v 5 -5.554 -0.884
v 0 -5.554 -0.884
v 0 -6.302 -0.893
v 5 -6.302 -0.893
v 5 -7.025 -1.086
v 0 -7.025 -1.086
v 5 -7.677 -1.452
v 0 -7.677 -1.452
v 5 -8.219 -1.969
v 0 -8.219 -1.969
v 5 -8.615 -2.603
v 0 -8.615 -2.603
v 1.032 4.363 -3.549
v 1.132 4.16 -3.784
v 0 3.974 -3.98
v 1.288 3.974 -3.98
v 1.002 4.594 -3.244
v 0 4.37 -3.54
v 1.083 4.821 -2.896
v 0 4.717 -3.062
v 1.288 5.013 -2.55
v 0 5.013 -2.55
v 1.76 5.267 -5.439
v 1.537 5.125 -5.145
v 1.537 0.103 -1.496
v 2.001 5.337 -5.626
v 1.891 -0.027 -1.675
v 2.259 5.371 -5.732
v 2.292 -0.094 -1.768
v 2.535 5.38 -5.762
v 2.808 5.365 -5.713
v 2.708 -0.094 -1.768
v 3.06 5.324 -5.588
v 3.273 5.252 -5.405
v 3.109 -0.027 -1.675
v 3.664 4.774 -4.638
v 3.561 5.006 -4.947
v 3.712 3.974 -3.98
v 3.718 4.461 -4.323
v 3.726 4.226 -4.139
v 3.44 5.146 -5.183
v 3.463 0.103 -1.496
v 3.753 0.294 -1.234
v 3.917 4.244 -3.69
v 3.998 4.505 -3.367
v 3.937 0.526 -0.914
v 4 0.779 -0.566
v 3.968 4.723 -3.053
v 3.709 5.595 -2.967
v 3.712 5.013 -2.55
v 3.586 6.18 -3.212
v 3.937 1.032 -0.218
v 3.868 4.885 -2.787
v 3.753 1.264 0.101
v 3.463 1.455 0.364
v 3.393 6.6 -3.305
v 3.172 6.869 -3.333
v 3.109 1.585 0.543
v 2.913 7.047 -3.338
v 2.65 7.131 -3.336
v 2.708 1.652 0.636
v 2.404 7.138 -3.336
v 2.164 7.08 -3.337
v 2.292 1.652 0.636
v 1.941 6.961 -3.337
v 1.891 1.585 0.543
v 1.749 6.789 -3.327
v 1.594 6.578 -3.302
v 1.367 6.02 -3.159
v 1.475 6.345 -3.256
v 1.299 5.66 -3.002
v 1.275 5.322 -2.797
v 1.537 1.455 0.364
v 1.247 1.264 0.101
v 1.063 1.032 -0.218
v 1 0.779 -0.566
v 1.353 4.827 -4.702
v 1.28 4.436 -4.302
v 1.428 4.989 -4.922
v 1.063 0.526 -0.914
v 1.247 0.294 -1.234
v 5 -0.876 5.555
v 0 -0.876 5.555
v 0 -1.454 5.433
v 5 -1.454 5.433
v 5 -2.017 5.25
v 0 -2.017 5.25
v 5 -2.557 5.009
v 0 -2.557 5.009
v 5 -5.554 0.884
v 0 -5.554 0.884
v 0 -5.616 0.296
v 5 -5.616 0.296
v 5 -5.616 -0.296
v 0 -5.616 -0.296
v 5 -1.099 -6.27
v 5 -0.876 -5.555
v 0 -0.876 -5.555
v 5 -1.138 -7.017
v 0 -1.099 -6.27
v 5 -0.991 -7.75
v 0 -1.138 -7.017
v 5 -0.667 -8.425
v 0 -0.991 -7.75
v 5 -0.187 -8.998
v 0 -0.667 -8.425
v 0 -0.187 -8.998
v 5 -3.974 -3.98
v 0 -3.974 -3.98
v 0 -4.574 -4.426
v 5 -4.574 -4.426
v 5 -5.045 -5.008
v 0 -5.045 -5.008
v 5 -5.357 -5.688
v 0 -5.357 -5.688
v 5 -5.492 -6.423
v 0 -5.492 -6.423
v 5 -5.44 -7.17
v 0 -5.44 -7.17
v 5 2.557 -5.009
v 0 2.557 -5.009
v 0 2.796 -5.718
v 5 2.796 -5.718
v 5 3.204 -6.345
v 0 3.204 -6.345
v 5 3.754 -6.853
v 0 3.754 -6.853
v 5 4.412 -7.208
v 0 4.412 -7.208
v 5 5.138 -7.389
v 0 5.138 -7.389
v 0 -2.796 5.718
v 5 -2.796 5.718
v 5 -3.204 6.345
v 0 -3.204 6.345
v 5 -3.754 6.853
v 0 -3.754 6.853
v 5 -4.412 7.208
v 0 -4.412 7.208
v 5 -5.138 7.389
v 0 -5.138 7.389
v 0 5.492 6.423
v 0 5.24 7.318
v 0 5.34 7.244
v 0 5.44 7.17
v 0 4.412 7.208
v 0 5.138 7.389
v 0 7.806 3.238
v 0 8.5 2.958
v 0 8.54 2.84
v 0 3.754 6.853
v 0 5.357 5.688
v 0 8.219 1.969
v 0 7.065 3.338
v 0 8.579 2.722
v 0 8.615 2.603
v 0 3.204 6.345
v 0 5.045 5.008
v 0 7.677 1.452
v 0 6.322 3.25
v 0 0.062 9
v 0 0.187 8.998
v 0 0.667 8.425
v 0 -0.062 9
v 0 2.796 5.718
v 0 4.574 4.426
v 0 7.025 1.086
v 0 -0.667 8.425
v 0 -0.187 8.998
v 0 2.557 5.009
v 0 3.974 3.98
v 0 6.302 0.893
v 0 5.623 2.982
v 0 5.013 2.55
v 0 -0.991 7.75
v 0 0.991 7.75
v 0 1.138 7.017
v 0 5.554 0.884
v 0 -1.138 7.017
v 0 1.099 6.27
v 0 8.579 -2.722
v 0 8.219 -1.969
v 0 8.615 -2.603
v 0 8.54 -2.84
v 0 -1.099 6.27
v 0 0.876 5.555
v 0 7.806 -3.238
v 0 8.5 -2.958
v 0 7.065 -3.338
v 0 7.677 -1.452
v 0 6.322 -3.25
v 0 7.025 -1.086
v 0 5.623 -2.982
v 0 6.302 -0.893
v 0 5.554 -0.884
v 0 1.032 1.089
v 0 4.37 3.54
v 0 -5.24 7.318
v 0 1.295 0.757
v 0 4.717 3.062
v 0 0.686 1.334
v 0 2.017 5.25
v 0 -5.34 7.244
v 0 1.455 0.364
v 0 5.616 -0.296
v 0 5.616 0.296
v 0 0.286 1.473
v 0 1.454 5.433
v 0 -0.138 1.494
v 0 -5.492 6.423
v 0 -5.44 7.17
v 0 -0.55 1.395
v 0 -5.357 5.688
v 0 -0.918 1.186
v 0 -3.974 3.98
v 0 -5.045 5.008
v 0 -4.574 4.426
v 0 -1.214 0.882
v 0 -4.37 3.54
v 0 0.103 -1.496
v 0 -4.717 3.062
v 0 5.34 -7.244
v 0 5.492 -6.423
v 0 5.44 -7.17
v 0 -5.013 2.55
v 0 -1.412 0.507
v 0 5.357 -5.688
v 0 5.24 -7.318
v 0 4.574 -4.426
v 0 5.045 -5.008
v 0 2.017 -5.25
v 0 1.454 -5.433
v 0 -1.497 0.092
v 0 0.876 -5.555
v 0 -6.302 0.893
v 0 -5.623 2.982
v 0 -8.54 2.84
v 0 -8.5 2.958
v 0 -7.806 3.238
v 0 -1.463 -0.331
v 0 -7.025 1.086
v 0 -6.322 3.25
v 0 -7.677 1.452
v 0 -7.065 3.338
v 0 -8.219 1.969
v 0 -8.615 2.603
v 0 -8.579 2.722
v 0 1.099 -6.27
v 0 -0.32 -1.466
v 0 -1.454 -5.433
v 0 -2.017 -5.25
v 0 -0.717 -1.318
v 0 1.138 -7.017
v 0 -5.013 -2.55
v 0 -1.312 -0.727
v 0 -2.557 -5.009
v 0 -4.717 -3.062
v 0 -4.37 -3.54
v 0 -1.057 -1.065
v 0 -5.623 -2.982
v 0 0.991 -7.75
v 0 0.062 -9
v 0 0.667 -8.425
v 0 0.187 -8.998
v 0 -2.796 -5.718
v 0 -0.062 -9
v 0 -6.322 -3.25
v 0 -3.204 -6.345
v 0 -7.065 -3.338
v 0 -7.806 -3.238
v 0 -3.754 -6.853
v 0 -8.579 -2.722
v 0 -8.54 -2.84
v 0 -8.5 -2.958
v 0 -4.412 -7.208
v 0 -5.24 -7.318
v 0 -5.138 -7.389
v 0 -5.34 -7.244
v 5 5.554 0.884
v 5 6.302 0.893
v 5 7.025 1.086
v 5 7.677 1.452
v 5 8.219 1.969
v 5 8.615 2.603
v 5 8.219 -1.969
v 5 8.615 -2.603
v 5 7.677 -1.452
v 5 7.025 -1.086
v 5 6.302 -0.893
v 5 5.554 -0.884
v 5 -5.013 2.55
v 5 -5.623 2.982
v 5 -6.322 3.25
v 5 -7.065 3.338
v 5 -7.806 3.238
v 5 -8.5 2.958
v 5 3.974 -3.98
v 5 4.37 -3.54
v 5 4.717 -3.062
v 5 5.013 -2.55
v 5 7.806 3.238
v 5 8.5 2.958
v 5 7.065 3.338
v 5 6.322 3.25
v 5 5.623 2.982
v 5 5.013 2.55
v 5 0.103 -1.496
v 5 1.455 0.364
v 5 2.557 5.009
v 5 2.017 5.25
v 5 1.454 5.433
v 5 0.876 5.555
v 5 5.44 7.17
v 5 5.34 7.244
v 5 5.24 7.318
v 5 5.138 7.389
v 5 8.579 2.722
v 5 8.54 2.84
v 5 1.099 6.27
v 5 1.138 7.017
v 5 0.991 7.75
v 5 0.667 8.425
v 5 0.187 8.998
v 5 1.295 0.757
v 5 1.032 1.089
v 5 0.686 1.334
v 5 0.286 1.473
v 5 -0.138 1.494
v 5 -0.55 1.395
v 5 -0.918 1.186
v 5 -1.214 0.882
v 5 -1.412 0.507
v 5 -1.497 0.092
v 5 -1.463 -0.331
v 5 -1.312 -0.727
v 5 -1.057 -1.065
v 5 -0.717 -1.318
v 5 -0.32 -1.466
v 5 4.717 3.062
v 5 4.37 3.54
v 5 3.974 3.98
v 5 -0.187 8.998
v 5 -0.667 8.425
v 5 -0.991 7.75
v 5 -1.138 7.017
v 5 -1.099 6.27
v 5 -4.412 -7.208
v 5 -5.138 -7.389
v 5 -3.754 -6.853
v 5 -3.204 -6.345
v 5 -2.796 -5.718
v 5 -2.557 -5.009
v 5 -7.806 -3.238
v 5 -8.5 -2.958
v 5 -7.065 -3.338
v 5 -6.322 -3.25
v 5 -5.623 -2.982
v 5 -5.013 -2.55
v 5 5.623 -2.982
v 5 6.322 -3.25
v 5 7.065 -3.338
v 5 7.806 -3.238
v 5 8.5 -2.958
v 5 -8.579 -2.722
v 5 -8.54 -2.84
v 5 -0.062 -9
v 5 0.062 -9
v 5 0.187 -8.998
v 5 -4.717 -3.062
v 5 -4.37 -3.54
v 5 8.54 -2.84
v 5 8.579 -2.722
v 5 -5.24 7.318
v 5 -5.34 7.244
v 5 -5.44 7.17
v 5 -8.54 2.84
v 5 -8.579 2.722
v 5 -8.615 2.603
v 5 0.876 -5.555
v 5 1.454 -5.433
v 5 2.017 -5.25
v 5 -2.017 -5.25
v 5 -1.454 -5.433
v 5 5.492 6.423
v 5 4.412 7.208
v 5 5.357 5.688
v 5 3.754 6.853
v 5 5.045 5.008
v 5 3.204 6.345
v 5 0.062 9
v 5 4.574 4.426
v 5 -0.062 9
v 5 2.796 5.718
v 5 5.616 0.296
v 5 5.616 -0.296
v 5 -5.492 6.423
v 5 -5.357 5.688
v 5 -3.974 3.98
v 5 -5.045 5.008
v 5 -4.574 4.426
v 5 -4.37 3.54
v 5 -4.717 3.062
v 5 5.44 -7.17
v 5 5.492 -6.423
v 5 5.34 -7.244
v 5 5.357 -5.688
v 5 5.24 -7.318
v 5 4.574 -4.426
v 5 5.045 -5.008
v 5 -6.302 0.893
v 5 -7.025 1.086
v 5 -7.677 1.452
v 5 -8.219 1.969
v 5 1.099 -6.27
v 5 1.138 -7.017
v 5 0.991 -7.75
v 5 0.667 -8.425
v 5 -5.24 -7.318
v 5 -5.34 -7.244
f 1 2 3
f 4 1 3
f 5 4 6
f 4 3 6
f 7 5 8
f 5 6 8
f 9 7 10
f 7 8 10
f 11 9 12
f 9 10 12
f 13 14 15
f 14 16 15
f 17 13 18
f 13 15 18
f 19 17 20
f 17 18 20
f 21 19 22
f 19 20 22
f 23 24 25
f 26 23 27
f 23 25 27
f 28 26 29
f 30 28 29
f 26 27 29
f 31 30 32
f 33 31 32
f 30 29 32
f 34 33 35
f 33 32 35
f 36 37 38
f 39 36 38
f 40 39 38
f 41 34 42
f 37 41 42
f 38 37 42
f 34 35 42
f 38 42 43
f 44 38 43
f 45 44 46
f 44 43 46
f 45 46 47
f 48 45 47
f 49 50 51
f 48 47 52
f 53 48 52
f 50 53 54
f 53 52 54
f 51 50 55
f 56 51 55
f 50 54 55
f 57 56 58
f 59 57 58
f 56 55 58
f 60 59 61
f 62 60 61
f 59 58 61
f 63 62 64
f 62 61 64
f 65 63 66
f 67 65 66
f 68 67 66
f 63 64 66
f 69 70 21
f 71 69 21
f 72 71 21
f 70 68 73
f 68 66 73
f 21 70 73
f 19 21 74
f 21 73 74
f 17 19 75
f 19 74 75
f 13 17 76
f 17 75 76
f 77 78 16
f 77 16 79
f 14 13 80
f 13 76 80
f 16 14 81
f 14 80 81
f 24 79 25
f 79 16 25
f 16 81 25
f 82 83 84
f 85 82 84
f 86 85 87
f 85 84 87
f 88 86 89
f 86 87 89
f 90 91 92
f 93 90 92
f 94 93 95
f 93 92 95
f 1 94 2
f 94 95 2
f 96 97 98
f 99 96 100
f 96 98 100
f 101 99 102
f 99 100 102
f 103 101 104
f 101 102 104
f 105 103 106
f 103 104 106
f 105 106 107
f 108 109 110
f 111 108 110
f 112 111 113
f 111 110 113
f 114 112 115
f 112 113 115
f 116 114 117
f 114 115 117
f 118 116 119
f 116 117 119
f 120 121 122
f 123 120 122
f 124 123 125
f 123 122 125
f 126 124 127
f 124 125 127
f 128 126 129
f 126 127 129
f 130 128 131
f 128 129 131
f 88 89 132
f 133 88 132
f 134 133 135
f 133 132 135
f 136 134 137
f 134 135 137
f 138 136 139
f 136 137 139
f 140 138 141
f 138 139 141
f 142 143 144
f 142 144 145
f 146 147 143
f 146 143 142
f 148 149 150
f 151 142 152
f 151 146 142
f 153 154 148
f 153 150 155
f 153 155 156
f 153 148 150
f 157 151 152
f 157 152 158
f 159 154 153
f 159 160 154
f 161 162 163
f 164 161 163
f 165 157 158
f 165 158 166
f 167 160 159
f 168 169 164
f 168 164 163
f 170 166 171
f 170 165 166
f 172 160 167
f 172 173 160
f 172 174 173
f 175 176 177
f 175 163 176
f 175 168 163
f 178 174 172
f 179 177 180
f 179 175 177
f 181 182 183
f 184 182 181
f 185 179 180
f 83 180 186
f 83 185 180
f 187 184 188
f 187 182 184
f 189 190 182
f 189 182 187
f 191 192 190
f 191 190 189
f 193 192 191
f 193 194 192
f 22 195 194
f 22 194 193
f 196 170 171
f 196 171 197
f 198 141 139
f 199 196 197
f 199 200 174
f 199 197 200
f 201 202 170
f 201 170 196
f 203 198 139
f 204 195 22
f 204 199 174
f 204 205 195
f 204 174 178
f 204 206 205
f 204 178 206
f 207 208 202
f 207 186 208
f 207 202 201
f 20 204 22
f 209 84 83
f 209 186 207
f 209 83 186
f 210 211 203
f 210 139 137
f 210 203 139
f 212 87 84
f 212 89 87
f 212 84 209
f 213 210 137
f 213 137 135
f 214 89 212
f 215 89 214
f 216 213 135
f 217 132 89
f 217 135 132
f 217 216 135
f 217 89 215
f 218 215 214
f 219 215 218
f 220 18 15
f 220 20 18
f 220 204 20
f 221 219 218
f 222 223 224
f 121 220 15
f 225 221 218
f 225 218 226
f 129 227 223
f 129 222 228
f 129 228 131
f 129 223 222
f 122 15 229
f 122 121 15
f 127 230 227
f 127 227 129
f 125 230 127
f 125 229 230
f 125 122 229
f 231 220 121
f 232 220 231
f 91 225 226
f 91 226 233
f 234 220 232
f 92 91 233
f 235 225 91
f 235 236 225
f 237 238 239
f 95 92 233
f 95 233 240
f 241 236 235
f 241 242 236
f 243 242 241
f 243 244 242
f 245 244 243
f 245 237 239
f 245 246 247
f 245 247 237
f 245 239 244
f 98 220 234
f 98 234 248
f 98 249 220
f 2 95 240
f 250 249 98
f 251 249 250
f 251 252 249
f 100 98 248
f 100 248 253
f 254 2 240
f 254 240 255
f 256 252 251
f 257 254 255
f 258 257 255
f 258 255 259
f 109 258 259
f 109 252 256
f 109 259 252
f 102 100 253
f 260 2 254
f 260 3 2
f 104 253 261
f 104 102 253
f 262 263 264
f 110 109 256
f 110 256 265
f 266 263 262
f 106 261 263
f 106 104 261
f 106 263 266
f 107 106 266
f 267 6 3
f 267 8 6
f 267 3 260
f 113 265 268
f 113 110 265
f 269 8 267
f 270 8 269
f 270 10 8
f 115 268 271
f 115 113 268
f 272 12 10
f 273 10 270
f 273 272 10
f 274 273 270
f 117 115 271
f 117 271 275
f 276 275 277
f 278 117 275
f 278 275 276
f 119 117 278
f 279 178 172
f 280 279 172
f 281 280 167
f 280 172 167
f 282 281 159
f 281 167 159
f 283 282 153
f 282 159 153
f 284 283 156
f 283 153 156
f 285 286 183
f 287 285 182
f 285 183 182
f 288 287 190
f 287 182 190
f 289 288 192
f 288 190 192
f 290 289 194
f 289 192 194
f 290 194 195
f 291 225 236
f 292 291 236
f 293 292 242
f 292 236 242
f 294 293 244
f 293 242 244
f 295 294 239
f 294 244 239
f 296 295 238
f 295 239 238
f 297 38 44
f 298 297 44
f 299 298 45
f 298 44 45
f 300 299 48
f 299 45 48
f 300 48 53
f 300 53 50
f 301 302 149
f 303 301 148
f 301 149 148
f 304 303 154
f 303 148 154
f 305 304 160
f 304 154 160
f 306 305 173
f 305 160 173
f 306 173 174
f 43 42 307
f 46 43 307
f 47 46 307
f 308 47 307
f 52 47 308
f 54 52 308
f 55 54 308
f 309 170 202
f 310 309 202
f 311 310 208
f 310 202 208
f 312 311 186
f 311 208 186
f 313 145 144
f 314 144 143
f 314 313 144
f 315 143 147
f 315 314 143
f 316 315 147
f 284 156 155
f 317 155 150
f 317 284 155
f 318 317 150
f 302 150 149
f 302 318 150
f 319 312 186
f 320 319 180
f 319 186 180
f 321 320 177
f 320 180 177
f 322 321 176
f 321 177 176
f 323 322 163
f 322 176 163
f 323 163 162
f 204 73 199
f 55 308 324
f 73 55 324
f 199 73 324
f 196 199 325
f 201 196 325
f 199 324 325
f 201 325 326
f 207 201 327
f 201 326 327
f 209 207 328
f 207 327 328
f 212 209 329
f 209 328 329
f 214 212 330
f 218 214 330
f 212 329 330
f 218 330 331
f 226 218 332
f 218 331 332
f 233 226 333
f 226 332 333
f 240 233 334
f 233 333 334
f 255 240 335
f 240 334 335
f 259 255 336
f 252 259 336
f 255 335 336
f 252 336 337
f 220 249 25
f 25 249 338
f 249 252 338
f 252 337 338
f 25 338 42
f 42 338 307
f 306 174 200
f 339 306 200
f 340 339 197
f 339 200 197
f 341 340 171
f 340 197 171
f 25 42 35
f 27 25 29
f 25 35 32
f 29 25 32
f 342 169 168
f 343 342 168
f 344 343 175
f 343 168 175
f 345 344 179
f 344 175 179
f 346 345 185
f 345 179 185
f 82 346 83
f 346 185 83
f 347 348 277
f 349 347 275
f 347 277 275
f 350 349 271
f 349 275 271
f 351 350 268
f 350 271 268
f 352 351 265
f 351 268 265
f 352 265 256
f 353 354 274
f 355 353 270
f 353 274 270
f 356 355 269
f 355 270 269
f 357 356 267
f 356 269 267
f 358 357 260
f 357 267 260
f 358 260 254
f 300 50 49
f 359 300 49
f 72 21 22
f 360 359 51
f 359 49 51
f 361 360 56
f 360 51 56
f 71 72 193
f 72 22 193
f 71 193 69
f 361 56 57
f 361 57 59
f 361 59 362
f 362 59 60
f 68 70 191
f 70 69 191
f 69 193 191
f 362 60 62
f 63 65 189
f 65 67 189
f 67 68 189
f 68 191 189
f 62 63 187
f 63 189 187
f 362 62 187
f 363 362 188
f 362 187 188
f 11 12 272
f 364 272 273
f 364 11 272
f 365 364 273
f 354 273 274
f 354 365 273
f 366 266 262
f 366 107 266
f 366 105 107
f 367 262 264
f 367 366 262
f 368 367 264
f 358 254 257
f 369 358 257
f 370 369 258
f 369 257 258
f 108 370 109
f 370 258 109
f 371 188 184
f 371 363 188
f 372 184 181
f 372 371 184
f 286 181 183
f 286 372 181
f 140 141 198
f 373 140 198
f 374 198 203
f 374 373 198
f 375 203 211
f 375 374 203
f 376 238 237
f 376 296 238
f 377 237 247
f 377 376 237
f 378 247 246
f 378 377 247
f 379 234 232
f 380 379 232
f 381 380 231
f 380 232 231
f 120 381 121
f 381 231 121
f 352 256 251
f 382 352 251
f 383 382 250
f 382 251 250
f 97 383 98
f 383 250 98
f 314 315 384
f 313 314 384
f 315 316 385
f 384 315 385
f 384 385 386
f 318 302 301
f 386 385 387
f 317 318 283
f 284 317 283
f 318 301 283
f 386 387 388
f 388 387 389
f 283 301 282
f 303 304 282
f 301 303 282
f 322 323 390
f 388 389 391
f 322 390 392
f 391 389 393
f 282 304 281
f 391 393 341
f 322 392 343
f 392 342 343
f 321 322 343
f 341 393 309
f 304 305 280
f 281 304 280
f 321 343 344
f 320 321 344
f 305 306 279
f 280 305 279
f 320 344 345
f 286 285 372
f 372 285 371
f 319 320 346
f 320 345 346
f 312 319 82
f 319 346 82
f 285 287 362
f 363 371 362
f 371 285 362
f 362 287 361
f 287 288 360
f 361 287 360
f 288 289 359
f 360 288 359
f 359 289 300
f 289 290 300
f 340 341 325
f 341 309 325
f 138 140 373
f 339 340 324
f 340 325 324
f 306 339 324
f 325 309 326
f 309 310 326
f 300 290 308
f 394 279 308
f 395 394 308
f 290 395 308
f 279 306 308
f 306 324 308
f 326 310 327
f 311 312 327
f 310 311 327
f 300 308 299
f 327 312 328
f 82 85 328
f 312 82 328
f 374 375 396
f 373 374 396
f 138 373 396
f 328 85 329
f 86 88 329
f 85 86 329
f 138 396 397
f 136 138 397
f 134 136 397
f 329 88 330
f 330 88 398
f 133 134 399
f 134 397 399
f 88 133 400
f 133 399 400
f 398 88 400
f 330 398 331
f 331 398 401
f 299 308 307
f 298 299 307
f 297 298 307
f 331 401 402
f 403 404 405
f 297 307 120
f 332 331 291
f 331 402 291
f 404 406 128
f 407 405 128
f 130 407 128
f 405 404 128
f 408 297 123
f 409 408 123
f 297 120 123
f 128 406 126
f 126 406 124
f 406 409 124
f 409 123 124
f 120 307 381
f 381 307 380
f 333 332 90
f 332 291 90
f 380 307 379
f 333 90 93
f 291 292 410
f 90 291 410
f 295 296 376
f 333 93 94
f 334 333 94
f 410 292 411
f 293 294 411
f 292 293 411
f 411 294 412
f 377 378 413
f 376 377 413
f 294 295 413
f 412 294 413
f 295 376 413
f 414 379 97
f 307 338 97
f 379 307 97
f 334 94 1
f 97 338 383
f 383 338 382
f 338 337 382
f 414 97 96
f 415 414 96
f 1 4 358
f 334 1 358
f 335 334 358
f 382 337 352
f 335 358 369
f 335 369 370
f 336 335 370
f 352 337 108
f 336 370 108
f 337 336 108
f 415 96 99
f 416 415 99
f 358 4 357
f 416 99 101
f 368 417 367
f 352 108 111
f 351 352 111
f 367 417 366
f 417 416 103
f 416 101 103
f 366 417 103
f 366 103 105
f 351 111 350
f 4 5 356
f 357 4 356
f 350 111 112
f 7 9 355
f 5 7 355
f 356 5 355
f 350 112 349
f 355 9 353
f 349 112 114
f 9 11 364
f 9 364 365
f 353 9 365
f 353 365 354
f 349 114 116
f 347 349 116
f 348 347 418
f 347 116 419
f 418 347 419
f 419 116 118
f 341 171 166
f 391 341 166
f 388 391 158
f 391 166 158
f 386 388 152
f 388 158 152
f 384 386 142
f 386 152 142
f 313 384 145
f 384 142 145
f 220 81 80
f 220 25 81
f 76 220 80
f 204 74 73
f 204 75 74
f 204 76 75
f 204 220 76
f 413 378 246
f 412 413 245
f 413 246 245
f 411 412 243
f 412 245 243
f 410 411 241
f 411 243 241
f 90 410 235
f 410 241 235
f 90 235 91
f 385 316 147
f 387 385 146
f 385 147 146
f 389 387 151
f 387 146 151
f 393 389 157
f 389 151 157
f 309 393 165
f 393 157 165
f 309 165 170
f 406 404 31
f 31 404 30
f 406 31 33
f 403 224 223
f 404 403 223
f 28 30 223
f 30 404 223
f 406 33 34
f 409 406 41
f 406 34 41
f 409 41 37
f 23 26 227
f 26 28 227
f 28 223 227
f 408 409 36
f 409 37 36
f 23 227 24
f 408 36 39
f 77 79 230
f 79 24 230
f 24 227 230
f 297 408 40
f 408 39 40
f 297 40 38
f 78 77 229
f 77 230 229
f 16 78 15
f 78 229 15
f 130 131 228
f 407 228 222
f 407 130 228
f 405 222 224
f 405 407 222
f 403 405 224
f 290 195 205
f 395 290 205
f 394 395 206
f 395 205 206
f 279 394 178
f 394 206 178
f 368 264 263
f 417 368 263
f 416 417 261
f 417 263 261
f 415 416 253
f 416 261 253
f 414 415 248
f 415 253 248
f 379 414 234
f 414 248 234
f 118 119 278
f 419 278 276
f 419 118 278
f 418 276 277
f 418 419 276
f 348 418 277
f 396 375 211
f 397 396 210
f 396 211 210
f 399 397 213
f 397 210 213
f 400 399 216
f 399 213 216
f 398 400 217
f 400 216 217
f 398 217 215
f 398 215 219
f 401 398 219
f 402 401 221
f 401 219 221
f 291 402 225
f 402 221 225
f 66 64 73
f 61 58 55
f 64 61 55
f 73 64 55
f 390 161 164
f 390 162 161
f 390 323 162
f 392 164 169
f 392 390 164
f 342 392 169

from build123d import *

# Parameters (mm, degrees)
BASPROSKE_W         = 5
BASPROSKE_H         = 9
TOOTHCUT_DEPTH      = 14.674794331
TEETHCUTS_COUNT     = 10
TEETHCUTS_ANGLE     = 324
BORSKE_R            = 1.5
BORE_DEPTH          = 50.0001524
EXTRUDE_1_DEPTH     = 5
SKETCH_3_R          = 1.5
CUT_EXTRUDE_1_DEPTH = 7


with BuildPart() as part:
    # BasProSke → Base-Revolve (revolve)
    with BuildSketch(Plane(origin=(0, 0, 0), x_dir=(1, 0, 0), z_dir=(0, 1, 0)), mode=Mode.PRIVATE) as base_revolve_sk:
        with Locations((2.5, 4.5)):
            Rectangle(BASPROSKE_W, BASPROSKE_H)
    revolve(base_revolve_sk.sketch.rotate(Axis((-10, 0, 0), (1, 0, 0)), 180), axis=Axis((-10, 0, 0), (1, 0, 0)))

    # TooCutSke → ToothCut (cut, through all)
    with BuildSketch(Plane(origin=(0, 0, 0), x_dir=(0, 0, -1), z_dir=(1, 0, 0))):
        with BuildLine():
            ThreePointArc((0.883878355, 5.554109745), (0, 5.624), (-0.883878355, 5.554109745))
            ThreePointArc((-0.883878355, 5.554109745), (-1.258245767, 7.379188248), (-2.637816971, 8.631324741))
            ThreePointArc((-2.637816971, 8.631324741), (0, 9.0254), (2.637816971, 8.631324741))
            ThreePointArc((2.637816971, 8.631324741), (1.258245767, 7.379188248), (0.883878355, 5.554109745))
        make_face()
    toothcut = extrude(amount=TOOTHCUT_DEPTH, mode=Mode.SUBTRACT)

    # TeethCuts: ToothCut ×10 about axis
    teethcuts_axis = Axis((-10, 0, 0), (1, 0, 0))
    for i in range(1, TEETHCUTS_COUNT):
        add(toothcut.rotate(teethcuts_axis, i * TEETHCUTS_ANGLE / (TEETHCUTS_COUNT - 1)), mode=Mode.SUBTRACT)

    # BorSke → Bore (cut, symmetric)
    with BuildSketch(Plane(origin=(0, 0, 0), x_dir=(0, 0, -1), z_dir=(1, 0, 0))):
        with Locations(Location((0, 0, 0), (0, 0, 180))):
            Circle(BORSKE_R)
    extrude(amount=BORE_DEPTH, both=True, mode=Mode.SUBTRACT)

    # 草圖2 → 填料-伸長1 (add, through all)
    with BuildSketch(Plane(origin=(0, 0, 0), x_dir=(0, 0, -1), z_dir=(1, 0, 0))):
        with BuildLine():
            ThreePointArc((-0.364292368, 1.45509143), (0.881677878, 1.213525492), (1.496446719, 0.10318535))
            Line((1.496446719, 0.10318535), (-0.364292368, 1.45509143))
        make_face()
    extrude(amount=EXTRUDE_1_DEPTH)

    # 草圖3 → 除料-伸長1 (cut)
    with BuildSketch(Plane(origin=(0, 0.77913839, -0.566077176), x_dir=(1, 0, 0), z_dir=(0, -0.8090169943749549, 0.5877852522924627))):
        with Locations(Location((2.5, 0, 0), (0, 0, 230.05549481))):
            Circle(SKETCH_3_R)
    extrude(amount=-CUT_EXTRUDE_1_DEPTH, mode=Mode.SUBTRACT)


solid = part.part
